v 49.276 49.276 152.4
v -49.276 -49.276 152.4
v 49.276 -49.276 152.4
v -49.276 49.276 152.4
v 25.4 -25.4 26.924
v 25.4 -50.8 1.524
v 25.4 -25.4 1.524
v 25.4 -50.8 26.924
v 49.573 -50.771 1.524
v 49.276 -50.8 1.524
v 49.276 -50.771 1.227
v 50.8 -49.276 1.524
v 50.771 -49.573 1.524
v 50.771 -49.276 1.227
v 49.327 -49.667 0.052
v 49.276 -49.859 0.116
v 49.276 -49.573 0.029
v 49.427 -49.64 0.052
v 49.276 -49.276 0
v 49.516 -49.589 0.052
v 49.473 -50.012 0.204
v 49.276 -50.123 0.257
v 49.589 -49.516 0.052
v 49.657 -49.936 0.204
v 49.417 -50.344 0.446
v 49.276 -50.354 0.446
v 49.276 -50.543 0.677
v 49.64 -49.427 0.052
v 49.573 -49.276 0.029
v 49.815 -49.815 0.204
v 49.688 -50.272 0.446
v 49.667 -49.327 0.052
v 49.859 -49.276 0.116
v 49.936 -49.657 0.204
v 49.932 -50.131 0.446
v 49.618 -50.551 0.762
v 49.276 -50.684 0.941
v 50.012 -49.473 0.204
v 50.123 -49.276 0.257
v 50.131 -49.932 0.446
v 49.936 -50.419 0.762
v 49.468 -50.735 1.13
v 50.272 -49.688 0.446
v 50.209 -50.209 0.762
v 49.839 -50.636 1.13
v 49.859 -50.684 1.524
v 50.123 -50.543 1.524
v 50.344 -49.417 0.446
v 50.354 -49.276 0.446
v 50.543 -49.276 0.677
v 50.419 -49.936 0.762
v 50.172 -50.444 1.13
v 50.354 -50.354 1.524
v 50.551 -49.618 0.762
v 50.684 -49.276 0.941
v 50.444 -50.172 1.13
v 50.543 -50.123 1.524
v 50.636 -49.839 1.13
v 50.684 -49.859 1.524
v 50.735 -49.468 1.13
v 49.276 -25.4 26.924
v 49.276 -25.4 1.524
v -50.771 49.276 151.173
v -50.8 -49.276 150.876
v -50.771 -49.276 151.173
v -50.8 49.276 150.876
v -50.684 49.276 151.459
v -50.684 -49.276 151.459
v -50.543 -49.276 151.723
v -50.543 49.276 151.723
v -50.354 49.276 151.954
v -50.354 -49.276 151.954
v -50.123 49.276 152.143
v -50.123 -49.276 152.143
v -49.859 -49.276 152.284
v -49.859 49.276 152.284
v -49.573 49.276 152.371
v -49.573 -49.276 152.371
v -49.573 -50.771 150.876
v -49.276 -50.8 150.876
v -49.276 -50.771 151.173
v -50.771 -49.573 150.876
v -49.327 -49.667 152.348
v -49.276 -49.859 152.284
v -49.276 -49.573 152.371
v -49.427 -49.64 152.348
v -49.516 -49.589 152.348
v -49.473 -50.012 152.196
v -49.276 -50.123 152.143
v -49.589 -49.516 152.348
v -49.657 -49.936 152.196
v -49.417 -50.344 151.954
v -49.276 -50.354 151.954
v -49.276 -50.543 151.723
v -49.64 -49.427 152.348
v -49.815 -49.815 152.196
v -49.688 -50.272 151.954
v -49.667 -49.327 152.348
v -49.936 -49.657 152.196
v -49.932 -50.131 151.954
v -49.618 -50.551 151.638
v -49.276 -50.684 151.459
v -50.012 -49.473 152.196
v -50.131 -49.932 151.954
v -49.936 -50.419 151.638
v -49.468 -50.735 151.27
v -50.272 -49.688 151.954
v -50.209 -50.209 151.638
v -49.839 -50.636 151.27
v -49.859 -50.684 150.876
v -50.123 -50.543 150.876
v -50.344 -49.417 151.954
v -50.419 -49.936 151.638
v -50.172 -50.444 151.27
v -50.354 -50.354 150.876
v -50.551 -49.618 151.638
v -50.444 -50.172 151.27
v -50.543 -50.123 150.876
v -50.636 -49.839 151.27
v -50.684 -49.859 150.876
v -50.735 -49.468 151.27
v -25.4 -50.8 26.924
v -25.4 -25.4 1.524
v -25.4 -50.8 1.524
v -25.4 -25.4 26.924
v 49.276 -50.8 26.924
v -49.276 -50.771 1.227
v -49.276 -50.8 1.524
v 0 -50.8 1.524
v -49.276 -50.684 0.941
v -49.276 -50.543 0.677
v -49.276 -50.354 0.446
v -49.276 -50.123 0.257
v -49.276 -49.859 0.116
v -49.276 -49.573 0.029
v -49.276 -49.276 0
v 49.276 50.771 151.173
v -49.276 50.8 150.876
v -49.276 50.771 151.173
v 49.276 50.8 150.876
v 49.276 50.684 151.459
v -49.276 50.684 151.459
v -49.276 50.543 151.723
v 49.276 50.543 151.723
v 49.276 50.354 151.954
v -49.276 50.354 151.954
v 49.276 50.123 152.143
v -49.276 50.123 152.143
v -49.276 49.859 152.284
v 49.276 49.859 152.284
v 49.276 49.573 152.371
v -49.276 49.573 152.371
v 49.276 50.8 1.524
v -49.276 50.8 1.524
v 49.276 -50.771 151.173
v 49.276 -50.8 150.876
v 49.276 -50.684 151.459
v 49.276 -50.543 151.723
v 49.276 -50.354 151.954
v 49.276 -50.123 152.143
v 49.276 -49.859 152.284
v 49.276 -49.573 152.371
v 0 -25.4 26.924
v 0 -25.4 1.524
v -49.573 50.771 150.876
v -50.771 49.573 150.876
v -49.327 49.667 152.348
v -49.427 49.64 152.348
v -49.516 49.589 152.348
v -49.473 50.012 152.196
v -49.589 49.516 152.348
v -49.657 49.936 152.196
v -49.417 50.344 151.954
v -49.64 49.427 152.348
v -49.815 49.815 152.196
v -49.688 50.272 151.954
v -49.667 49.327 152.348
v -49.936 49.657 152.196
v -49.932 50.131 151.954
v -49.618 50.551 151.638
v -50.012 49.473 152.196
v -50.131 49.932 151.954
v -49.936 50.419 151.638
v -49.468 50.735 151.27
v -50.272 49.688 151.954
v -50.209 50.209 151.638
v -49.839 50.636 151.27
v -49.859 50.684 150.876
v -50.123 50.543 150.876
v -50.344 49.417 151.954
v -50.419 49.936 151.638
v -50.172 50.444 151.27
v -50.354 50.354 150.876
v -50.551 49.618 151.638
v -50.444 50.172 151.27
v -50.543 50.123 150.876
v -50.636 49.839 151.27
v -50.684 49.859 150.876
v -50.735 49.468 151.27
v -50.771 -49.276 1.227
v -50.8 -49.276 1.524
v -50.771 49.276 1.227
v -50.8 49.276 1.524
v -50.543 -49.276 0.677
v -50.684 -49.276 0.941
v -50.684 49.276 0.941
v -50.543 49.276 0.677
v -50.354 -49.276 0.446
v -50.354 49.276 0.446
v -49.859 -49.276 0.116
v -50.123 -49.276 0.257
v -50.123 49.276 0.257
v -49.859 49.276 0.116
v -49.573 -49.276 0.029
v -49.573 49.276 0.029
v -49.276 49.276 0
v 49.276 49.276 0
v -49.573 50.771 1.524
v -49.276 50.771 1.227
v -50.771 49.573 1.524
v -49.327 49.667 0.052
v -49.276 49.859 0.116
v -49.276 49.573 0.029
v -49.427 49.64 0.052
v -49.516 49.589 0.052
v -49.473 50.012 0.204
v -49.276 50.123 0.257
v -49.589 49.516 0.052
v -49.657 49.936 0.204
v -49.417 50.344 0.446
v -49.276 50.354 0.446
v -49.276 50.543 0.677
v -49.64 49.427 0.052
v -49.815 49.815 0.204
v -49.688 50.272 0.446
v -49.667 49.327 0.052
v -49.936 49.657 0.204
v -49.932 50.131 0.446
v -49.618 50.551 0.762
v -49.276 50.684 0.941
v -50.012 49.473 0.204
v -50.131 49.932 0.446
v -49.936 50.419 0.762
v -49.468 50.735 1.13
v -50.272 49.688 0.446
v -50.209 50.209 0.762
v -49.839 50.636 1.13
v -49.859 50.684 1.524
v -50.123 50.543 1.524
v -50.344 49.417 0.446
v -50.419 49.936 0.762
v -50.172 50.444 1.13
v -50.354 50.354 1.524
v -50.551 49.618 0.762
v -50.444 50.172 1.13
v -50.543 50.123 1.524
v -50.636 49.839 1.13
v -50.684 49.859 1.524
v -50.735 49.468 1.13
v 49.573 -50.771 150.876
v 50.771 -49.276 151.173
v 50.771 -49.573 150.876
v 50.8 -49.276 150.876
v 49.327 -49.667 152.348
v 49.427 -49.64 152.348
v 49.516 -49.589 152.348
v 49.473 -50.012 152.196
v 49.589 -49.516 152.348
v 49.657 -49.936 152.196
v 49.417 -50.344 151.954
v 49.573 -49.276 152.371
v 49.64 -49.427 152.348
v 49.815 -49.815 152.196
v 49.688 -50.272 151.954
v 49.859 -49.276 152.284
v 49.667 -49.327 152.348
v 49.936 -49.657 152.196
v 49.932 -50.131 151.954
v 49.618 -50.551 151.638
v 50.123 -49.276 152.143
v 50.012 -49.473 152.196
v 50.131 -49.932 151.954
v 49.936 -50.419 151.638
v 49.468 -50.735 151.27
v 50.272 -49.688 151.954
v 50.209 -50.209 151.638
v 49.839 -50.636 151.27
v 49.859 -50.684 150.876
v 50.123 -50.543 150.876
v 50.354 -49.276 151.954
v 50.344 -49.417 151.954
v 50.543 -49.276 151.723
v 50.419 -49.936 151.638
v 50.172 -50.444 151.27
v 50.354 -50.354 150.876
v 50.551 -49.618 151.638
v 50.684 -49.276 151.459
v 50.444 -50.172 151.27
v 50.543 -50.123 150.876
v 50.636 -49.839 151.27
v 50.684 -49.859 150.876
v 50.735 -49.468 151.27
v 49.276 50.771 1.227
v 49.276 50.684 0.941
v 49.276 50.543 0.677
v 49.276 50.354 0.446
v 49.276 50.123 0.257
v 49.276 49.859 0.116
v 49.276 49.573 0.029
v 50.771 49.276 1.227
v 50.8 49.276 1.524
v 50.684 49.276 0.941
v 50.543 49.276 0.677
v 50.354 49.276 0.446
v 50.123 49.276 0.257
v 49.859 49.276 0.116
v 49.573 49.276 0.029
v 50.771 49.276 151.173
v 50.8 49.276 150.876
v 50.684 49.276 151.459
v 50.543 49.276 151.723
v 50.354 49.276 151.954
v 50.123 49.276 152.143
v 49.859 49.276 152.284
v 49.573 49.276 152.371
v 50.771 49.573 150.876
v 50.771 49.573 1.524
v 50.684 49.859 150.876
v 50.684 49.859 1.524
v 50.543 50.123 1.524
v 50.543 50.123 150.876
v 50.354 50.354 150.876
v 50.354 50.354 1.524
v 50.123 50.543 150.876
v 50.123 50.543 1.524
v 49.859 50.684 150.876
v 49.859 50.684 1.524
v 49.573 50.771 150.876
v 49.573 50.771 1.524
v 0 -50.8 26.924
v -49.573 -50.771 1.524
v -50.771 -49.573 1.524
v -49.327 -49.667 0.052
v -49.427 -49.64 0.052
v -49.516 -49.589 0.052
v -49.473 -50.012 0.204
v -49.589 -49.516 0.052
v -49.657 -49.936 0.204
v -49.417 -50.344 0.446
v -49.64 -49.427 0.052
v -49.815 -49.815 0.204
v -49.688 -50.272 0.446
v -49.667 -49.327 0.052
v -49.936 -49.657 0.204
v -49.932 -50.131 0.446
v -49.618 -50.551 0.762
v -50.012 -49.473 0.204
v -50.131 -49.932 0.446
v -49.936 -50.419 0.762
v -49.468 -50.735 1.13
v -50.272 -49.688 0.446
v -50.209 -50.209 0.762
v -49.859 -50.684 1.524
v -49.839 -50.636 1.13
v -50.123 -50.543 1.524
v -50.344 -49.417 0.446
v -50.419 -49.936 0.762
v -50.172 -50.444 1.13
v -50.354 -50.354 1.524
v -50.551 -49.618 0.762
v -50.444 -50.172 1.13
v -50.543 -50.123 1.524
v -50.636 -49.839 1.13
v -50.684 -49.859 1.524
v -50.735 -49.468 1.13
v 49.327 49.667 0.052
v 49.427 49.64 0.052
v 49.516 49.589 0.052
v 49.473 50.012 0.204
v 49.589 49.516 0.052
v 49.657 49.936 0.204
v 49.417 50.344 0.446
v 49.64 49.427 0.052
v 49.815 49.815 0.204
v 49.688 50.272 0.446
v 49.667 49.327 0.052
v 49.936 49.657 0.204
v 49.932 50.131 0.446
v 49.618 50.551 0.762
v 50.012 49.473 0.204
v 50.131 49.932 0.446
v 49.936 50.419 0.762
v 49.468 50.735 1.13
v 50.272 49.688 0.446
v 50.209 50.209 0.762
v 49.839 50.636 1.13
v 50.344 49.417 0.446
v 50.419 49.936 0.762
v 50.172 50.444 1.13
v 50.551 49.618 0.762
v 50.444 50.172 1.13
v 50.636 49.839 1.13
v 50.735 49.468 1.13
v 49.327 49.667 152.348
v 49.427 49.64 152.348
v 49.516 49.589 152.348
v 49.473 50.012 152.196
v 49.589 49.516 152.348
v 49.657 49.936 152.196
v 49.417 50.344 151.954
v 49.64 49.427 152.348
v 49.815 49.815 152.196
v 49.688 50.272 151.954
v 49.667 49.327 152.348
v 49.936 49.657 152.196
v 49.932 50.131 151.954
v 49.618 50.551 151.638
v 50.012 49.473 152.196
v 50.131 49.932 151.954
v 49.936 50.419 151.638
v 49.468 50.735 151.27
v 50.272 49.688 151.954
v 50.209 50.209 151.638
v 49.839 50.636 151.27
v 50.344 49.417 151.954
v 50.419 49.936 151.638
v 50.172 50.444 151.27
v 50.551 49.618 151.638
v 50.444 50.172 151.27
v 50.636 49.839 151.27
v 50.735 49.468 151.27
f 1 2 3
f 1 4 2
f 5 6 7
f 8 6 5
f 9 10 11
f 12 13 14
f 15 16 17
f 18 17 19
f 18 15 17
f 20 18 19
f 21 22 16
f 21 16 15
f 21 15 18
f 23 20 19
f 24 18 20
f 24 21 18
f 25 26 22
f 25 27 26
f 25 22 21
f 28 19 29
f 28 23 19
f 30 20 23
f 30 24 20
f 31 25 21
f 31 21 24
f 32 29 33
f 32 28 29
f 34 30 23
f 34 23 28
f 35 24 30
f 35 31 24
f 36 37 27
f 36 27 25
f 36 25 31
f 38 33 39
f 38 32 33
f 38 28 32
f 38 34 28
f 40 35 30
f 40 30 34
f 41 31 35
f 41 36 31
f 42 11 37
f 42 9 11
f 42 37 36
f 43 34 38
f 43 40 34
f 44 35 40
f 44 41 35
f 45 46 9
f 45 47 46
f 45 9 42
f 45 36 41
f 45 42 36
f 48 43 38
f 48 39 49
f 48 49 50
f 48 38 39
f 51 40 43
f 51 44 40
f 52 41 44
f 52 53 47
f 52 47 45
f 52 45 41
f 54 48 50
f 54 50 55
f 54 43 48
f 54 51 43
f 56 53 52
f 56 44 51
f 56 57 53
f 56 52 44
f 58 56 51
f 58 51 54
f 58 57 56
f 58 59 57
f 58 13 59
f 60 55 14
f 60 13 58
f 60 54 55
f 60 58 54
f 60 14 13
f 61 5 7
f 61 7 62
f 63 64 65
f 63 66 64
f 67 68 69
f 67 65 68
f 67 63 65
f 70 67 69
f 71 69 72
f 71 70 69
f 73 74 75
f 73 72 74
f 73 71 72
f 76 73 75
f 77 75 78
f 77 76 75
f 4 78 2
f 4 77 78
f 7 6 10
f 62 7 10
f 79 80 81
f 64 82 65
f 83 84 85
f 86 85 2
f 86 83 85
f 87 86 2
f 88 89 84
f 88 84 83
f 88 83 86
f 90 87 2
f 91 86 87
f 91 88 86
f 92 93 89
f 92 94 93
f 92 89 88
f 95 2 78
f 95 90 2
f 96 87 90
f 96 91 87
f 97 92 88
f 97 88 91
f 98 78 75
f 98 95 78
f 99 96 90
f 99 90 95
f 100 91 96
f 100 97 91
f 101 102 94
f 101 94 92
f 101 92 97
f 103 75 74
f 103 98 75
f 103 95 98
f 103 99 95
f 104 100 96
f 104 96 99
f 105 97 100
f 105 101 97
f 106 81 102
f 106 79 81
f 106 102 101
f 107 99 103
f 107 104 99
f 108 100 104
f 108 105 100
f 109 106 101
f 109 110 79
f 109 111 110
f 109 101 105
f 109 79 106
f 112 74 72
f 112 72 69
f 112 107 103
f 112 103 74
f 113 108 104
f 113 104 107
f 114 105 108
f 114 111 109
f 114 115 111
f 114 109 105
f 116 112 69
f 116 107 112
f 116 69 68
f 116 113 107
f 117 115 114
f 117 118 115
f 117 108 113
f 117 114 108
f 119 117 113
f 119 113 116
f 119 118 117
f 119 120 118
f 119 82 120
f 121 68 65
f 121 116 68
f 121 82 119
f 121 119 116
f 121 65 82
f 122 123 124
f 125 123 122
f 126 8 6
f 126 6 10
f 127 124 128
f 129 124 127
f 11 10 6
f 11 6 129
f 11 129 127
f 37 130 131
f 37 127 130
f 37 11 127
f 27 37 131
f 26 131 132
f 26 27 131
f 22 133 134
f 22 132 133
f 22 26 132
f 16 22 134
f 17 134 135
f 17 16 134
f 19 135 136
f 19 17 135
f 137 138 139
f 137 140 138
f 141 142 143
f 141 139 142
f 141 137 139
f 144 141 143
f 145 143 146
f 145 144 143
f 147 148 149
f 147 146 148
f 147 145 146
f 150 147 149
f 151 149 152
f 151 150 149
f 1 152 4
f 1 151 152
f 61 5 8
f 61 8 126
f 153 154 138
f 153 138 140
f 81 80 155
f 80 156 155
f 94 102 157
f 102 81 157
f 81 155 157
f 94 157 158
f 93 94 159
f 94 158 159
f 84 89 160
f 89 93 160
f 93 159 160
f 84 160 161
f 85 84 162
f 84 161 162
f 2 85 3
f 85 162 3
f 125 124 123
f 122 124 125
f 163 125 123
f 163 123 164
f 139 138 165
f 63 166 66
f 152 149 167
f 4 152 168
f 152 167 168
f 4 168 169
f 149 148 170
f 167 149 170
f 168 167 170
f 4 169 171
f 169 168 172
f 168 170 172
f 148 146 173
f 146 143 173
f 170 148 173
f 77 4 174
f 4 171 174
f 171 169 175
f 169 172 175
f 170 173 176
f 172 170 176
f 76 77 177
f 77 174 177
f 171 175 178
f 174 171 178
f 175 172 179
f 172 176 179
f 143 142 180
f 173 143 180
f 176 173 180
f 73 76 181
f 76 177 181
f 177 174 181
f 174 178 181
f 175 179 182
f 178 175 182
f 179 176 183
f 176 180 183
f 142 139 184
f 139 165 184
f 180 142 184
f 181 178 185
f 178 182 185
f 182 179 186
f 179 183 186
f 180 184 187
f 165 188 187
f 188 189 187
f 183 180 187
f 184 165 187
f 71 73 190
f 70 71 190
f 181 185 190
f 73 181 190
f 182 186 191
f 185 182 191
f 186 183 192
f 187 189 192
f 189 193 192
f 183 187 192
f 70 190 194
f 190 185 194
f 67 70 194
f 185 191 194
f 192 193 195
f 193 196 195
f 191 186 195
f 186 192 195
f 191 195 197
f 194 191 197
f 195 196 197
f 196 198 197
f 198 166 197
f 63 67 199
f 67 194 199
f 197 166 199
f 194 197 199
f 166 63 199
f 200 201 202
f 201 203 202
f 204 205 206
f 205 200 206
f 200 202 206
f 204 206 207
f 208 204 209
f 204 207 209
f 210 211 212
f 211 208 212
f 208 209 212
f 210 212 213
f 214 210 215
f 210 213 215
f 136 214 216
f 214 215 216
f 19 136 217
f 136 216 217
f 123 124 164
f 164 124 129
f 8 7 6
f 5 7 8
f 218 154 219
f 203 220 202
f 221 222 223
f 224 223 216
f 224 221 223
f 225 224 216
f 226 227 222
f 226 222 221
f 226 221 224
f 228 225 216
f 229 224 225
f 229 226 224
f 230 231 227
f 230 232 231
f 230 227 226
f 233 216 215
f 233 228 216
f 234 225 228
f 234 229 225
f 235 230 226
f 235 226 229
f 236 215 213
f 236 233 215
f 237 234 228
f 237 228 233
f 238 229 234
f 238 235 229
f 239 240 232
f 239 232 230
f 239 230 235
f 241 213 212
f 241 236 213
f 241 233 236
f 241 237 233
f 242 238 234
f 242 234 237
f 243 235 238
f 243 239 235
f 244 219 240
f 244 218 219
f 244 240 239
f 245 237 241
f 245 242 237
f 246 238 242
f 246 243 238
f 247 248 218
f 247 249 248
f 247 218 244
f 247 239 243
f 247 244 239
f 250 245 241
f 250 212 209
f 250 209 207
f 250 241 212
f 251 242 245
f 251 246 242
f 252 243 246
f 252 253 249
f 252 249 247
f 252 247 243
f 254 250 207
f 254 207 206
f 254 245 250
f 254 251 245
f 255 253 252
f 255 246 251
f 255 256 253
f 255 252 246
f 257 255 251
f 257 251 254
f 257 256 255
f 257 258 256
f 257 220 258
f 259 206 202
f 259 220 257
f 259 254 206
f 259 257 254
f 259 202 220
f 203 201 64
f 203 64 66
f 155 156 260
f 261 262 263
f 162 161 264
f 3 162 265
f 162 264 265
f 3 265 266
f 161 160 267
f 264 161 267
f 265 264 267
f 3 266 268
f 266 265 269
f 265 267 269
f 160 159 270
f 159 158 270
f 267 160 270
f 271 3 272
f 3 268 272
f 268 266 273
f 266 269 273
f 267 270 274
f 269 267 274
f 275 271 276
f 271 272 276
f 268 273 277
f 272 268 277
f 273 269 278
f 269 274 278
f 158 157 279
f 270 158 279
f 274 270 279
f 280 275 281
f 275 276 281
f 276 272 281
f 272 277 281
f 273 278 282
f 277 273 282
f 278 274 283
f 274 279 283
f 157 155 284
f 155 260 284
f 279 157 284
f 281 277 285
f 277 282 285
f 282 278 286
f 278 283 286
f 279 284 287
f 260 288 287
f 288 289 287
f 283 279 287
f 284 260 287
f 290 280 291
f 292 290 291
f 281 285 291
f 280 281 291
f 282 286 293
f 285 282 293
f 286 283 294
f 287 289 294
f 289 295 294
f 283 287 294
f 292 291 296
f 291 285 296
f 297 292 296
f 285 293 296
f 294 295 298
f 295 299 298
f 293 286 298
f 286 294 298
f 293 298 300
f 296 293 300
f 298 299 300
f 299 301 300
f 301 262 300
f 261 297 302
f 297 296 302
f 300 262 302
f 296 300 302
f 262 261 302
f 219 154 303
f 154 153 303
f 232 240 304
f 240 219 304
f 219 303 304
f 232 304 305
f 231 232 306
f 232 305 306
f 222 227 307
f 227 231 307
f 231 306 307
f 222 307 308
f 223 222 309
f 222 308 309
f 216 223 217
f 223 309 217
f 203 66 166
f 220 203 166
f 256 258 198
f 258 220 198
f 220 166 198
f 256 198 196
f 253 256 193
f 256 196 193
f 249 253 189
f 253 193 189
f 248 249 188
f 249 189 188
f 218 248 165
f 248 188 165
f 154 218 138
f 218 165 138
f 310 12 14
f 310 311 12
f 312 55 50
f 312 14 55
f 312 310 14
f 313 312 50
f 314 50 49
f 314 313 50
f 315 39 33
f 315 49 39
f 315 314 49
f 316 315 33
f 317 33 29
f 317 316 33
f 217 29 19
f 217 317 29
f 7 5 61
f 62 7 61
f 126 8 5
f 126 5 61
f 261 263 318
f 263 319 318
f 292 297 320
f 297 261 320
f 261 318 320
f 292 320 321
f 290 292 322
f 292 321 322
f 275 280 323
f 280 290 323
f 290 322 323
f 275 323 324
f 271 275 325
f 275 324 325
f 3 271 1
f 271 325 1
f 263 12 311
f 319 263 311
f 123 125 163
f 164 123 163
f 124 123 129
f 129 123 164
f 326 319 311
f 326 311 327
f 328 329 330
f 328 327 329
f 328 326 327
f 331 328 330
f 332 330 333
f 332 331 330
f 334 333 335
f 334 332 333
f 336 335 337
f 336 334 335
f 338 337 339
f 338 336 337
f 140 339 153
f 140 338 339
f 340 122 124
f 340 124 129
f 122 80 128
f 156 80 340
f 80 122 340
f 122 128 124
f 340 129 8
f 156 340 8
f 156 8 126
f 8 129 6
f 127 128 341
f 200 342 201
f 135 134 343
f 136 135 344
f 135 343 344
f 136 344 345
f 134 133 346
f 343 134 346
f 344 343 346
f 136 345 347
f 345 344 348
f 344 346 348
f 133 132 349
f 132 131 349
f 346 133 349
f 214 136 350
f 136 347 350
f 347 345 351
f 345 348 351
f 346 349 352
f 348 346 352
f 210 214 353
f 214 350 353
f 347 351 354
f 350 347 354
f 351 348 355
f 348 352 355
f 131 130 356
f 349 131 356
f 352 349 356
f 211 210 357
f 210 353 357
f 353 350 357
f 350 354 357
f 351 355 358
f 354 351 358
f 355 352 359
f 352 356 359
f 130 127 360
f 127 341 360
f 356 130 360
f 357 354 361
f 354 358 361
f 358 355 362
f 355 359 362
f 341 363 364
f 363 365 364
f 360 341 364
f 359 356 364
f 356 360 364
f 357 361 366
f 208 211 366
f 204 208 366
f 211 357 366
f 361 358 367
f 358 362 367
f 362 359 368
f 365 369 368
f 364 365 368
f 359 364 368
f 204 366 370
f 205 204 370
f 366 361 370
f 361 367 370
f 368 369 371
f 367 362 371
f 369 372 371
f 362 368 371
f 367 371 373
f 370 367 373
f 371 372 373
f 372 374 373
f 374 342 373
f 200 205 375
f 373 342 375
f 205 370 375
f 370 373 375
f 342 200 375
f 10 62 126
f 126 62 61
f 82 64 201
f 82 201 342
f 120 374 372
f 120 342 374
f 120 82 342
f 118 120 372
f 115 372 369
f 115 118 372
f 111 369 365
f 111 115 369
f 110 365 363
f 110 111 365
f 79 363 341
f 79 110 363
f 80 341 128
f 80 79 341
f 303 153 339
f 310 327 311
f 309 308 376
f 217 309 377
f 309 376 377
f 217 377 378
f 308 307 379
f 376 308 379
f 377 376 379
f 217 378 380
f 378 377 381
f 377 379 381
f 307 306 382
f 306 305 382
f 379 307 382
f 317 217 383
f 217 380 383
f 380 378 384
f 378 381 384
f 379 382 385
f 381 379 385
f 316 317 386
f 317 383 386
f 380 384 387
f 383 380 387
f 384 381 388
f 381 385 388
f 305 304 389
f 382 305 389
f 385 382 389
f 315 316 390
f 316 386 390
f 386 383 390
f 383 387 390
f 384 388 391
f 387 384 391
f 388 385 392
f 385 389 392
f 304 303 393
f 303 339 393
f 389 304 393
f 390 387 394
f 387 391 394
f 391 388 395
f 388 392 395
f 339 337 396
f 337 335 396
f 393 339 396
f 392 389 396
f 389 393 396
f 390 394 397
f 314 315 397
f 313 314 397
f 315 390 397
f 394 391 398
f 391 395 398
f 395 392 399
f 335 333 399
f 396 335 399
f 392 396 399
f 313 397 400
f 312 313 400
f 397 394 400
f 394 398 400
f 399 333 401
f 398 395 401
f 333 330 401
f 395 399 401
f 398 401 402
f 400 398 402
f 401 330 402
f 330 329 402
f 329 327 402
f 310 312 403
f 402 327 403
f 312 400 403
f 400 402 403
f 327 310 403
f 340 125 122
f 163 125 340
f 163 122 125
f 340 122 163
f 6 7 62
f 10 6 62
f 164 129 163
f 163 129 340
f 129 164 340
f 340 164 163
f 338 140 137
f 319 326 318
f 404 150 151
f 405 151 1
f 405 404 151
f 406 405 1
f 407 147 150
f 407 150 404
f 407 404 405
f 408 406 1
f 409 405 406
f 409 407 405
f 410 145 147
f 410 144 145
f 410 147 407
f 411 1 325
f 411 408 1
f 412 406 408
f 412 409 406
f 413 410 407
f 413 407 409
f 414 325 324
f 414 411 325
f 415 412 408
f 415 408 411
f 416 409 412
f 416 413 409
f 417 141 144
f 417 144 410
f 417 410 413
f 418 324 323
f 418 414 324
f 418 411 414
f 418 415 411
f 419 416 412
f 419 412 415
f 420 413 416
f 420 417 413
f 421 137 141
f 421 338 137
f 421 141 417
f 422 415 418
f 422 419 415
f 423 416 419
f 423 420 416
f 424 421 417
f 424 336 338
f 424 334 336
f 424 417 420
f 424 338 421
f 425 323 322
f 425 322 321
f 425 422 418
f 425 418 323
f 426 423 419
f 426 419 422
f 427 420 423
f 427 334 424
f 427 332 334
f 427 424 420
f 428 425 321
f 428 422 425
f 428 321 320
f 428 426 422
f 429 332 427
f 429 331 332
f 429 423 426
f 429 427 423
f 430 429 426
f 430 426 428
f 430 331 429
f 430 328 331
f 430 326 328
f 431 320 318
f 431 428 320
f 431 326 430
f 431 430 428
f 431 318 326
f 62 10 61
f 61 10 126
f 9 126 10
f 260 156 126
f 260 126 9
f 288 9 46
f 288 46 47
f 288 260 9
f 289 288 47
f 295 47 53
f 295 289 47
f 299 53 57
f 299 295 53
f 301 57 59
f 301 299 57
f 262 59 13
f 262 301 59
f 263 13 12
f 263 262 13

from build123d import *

# Parameters (mm, degrees)
F0_W        = 101.6
F0_H        = 101.6
F1_DEPTH    = 152.4
F2_R        = 1.524
F3_W        = 25.4
F3_H        = 25.4
F3_W_2      = 23.876
F4_DEPTH    = 25.4
F4_FACE_W   = 23.876
F4_FACE_H   = 25.4
F4_FACE_W_2 = 25.4
F5_DEPTH    = 25.4


with BuildPart() as f1:
    # F0 (on Top) → F1 (new body)
    with BuildSketch(Plane.XY):
        Rectangle(F0_W, F0_H)
    extrude(amount=F1_DEPTH)

    # F2
    f2_edges = [f1.edges().sort_by_distance(p)[0] for p in [
        (-50.8, -50.8, 76.2),
        (50.8, -50.8, 76.2),
        (0, -50.8, 0),
        (0, -50.8, 152.4),
        (50.8, 50.8, 76.2),
        (-50.8, 50.8, 76.2),
        (0, 50.8, 0),
        (0, 50.8, 152.4),
        (50.8, 0, 152.4),
        (-50.8, 0, 152.4),
        (50.8, 0, 0),
        (-50.8, 0, 0),
    ]]
    fillet(f2_edges, radius=F2_R)

    # F3 (on face) → F4 (cut)
    with BuildSketch(Plane.XZ.offset(50.8)):
        with Locations((-12.7, 14.224)):
            Rectangle(F3_W, F3_H)
        with Locations((37.338, 14.224)):
            Rectangle(F3_W_2, F3_H)
    extrude(amount=-F4_DEPTH, mode=Mode.SUBTRACT)


with BuildPart() as f5:
    # F4_face (on face) → F5 (new body)
    with BuildSketch(Plane(origin=(37.338, -25.4, 14.224), x_dir=(1, 0, 0), z_dir=(0, -1, 0))):
        Rectangle(F4_FACE_W, F4_FACE_H)
        with Locations((-50.038, 0)):
            Rectangle(F4_FACE_W_2, F4_FACE_H)
    extrude(amount=F5_DEPTH)


solid = Compound([f1.part, f5.part])
